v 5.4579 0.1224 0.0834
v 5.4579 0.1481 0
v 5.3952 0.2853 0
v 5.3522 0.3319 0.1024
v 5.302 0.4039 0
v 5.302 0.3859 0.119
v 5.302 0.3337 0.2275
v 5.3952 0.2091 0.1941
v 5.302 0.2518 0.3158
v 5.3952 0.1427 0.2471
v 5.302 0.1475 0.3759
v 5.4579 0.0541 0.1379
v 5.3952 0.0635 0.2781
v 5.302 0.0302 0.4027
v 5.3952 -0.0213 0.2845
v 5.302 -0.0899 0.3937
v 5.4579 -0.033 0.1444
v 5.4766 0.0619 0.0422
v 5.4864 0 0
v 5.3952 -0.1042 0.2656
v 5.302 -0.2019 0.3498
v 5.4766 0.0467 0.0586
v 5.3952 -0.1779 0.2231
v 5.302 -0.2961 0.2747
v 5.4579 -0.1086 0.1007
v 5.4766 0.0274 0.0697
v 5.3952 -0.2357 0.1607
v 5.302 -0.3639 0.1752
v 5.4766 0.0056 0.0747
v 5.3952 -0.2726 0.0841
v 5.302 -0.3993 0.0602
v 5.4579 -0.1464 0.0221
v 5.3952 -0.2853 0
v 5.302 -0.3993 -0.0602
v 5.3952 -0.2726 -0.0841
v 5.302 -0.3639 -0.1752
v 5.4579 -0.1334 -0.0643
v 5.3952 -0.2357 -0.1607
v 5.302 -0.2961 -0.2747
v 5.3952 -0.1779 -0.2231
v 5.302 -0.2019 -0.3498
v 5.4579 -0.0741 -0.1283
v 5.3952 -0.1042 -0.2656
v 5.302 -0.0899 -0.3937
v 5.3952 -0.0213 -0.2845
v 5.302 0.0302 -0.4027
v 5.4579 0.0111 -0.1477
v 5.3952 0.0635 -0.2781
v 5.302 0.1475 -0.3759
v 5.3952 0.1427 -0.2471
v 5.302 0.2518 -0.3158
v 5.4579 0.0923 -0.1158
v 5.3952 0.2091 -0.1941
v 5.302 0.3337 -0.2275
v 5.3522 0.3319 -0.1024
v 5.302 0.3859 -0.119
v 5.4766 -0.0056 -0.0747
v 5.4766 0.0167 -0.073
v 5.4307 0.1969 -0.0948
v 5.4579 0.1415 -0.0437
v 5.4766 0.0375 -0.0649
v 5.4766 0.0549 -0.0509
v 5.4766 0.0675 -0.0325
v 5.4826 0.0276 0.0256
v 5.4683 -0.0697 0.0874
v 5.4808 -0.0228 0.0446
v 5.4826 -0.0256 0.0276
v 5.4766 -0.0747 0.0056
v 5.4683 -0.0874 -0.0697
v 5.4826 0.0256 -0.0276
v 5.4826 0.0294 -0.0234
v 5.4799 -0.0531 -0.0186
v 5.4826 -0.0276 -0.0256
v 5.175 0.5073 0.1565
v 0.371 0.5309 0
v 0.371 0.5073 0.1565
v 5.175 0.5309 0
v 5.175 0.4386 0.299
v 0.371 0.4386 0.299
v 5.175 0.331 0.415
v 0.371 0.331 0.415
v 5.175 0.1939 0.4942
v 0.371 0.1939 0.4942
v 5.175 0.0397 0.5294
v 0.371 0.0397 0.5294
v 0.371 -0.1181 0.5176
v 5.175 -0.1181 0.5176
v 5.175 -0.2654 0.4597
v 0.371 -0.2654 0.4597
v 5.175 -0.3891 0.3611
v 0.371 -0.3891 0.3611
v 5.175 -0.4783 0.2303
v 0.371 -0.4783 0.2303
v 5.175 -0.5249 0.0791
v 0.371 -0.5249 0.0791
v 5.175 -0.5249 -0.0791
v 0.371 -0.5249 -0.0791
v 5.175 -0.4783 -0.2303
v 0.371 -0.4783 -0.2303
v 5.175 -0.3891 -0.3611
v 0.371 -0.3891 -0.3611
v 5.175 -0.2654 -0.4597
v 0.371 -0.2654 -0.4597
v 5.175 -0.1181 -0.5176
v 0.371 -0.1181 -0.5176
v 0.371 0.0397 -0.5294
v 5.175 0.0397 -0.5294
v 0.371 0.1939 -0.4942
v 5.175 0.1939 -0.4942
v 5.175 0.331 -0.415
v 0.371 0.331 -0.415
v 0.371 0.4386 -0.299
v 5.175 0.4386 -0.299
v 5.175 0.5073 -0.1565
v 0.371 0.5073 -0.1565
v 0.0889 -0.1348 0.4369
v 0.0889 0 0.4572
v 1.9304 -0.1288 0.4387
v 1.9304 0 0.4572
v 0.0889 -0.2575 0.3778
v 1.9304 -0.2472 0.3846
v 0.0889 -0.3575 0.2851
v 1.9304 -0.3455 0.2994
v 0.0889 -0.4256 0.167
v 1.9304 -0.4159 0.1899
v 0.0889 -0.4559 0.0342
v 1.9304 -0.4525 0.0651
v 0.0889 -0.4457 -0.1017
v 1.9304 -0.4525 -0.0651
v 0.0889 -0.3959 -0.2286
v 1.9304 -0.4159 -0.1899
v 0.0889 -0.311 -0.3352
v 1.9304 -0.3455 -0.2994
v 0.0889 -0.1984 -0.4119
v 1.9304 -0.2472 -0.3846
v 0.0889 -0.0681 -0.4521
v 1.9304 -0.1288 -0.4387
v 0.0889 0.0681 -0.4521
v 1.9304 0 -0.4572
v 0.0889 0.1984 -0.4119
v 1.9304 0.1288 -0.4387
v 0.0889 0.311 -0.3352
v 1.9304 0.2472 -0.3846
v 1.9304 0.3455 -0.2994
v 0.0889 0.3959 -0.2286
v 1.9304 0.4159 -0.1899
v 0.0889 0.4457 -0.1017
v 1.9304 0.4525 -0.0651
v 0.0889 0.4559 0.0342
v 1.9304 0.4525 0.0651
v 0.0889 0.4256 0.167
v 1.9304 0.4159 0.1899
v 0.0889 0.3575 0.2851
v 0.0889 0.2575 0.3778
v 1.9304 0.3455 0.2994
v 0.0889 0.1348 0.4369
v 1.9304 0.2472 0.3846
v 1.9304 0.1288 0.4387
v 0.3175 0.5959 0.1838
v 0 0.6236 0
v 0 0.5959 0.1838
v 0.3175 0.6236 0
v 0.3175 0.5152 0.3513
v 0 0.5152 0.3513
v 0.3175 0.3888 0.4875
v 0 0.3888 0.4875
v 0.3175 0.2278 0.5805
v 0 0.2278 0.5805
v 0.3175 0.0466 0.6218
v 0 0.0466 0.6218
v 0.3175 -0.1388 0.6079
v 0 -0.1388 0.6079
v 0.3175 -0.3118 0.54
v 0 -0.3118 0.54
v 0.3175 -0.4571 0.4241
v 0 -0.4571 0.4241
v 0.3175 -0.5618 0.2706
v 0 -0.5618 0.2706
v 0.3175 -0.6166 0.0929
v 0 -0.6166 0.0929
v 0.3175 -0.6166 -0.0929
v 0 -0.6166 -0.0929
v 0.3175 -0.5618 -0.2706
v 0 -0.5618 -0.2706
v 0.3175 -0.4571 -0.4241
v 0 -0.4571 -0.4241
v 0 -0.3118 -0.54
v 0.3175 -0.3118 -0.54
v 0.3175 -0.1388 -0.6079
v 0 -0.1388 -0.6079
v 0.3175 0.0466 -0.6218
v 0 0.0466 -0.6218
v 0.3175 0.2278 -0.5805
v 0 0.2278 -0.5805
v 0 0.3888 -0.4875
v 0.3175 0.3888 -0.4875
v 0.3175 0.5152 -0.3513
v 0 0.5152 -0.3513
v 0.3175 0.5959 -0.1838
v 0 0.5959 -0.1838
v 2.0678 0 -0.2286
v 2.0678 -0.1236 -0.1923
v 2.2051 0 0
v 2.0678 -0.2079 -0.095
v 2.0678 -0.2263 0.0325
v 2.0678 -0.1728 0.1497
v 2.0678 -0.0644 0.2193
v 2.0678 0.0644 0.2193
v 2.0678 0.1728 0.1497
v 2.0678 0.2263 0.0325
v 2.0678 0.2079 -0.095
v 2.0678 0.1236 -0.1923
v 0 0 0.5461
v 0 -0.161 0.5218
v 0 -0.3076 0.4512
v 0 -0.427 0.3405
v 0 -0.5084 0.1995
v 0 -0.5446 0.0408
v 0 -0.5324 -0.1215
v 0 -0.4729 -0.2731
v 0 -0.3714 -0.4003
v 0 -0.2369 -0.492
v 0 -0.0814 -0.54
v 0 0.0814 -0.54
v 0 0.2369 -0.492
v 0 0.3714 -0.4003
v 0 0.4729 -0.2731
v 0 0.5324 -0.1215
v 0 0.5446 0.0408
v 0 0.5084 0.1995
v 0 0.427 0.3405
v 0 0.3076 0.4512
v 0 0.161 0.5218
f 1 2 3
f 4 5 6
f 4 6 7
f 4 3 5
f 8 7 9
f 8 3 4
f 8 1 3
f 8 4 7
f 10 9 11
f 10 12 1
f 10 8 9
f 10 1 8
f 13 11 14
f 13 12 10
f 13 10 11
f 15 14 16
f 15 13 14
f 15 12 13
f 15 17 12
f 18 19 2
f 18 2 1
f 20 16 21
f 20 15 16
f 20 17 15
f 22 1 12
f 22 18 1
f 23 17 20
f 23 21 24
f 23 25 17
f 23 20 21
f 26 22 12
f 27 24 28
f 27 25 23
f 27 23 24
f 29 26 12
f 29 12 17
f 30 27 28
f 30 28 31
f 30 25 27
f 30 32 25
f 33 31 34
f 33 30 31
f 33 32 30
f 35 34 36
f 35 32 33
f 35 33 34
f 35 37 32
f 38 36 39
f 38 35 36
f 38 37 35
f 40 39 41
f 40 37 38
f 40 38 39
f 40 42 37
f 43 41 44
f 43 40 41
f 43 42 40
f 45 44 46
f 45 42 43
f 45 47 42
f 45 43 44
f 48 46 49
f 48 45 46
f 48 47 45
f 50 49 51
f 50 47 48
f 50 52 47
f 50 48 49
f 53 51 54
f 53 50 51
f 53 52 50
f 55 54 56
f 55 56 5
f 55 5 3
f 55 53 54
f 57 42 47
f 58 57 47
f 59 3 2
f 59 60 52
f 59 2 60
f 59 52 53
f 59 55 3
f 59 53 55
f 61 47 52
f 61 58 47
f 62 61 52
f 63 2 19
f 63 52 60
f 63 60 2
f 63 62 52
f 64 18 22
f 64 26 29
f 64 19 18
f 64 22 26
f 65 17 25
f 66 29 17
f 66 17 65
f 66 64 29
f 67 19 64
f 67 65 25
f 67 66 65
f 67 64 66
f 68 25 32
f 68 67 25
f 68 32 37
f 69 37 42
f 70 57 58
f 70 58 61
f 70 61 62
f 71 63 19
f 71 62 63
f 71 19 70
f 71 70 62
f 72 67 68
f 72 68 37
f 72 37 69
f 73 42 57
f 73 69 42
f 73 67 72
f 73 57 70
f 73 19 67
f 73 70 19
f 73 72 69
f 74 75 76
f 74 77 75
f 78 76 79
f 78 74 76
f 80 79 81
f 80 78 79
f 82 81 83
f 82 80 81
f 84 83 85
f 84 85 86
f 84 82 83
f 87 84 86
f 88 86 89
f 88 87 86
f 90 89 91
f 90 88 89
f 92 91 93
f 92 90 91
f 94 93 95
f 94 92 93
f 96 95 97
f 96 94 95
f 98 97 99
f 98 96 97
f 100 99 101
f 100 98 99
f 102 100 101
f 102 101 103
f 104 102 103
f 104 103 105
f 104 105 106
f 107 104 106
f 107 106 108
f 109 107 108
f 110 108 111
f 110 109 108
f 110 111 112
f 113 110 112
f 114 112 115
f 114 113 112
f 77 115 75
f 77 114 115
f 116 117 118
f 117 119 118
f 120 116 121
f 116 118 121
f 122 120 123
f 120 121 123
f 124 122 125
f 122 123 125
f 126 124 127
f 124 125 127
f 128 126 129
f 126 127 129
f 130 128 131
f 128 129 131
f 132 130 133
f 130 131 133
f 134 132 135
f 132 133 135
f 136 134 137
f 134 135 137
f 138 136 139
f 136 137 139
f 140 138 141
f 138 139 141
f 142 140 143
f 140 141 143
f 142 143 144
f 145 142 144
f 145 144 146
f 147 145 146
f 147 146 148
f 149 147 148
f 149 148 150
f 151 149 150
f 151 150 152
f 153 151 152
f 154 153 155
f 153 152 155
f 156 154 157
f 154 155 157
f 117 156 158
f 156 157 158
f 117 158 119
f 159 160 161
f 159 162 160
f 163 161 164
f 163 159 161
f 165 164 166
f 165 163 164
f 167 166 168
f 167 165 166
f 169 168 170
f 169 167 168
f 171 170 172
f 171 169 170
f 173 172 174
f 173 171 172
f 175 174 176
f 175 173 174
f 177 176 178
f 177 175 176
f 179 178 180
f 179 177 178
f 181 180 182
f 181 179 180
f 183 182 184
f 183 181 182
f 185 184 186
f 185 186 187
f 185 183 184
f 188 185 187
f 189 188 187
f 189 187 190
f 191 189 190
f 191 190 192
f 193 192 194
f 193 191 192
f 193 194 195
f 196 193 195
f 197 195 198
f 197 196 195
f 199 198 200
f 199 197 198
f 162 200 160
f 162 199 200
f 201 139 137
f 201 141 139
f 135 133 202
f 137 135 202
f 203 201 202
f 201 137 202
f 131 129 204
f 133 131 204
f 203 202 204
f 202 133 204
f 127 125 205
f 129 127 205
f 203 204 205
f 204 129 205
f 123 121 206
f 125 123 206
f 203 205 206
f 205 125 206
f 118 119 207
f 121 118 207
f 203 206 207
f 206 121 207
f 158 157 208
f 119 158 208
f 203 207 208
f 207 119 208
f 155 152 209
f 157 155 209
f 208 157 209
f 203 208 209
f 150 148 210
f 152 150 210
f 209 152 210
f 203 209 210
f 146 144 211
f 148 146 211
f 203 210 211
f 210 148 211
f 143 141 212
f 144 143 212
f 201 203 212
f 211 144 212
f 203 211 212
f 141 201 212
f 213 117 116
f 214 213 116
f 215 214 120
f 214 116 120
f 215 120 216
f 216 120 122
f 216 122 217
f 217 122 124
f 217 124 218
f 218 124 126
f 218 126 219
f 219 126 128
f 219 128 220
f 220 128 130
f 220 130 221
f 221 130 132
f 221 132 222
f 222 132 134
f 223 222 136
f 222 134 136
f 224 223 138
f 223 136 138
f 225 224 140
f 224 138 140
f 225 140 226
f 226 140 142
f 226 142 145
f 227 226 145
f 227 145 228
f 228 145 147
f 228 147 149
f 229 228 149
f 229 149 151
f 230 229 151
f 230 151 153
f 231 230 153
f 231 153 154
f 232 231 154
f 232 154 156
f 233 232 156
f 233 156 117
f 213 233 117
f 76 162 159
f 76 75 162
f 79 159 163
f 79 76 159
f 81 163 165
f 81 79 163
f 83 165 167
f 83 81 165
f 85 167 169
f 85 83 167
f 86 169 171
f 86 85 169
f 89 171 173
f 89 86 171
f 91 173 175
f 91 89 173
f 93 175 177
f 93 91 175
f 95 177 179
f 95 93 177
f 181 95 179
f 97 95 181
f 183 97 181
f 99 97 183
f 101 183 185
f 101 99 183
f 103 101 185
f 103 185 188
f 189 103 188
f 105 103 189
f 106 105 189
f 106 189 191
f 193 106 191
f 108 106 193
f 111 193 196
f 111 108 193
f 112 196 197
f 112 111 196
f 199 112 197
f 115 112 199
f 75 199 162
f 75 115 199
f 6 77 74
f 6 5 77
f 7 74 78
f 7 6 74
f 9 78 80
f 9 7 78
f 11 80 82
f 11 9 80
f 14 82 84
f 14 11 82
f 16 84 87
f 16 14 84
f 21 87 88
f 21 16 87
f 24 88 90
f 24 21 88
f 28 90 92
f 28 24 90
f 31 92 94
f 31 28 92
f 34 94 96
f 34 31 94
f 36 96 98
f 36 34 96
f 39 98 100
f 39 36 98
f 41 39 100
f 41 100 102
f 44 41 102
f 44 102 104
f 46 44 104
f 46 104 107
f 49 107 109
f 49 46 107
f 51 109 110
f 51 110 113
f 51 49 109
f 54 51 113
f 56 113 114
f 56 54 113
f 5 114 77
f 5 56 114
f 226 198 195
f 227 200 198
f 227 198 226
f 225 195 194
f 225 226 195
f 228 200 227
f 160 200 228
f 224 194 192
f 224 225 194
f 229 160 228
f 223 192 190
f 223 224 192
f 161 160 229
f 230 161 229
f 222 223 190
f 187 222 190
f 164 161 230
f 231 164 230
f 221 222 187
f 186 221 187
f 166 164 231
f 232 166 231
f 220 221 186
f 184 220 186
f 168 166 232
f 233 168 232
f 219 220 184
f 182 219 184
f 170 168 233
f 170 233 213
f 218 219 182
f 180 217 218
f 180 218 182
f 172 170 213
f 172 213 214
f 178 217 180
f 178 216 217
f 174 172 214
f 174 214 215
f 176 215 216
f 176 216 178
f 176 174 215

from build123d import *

# Parameters (mm, degrees)
HOLE2_D           = 0.9144
HOLE2_DEPTH       = 1.9304
HOLE2_CSINK_D     = 1.0922
HOLE2_CSINK_ANGLE = 90
HOLE2_TIP         = 0.274713475


with BuildPart() as part:
    # Sketch1 → RevolutionAngle1 (revolve)
    with BuildSketch(Plane.XY):
        with BuildLine():
            Line((0, 0), (0, 0.62357))
            Line((0, 0.62357), (0.3175, 0.62357))
            Line((0.3175, 0.62357), (0.371026143, 0.53086))
            Line((0.371026143, 0.53086), (5.175020176, 0.53086))
            Line((5.175020176, 0.53086), (5.302020176, 0.40386))
            ThreePointArc((5.302020176, 0.40386), (5.430654413, 0.218568435), (5.4864, 0))
            Line((5.4864, 0), (0, 0))
        make_face()
    revolve(axis=Axis((0, 0, 0), (1, 0, 0)))

    # Hole2
    with Locations(Plane(origin=(0, 0, 0), x_dir=(0, 0, -1), z_dir=(-1, 0, 0))):
        with Locations((0, 0)):
            CounterSinkHole(HOLE2_D / 2, HOLE2_CSINK_D / 2, depth=HOLE2_DEPTH, counter_sink_angle=HOLE2_CSINK_ANGLE)
            with Locations((0, 0, -(HOLE2_DEPTH + HOLE2_TIP / 2))):  # 118° drill point
                Cone(0, HOLE2_D / 2, HOLE2_TIP, mode=Mode.SUBTRACT)


solid = part.part
